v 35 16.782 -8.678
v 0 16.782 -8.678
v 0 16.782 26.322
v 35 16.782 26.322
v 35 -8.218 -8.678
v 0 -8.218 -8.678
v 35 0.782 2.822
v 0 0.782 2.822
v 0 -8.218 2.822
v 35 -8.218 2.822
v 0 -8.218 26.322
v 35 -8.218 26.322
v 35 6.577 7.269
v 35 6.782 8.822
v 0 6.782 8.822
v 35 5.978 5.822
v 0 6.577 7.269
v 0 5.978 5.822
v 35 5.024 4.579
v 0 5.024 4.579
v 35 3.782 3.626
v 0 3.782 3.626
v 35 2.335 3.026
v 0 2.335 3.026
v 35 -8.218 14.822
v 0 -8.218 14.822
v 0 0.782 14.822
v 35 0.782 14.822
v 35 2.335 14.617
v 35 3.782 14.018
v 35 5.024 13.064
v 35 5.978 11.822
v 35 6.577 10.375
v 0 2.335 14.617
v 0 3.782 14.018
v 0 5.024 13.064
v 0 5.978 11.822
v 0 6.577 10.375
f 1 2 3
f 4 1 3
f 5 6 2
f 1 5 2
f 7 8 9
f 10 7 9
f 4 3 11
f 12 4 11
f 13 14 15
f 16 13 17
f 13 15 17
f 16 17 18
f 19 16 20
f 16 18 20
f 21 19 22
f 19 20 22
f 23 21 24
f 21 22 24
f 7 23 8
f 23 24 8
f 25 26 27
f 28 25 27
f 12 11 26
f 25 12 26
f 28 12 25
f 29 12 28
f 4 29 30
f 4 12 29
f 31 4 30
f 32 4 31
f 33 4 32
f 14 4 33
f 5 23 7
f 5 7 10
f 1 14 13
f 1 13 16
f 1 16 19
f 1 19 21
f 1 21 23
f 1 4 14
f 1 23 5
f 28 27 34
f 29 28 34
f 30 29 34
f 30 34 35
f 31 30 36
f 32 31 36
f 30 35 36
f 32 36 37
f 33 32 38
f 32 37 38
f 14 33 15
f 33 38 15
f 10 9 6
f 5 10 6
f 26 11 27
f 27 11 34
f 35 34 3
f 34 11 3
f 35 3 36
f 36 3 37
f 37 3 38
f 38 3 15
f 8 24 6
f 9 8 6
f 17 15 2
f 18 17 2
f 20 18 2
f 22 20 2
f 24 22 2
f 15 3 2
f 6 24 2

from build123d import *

# Parameters (mm, degrees)
BOSS_EXTRUDE1_DEPTH = 35


with BuildPart() as part:
    # Sketch1 → Boss-Extrude1 (new body)
    with BuildSketch(Plane(origin=(0, 0, 0), x_dir=(0, 0, -1), z_dir=(1, 0, 0))):
        with BuildLine():
            Line((-8.82183908, 6.781609195), (-8.82183908, 16.781609195))
            Line((-8.82183908, 16.781609195), (-26.32183908, 16.781609195))
            Line((-26.32183908, 16.781609195), (-26.32183908, -8.218390805))
            Line((-26.32183908, -8.218390805), (-14.82183908, -8.218390805))
            Line((-14.82183908, -8.218390805), (-14.82183908, 0.781609195))
            ThreePointArc((-14.82183908, 0.781609195), (-13.064479768, 5.024249883), (-8.82183908, 6.781609195))
        make_face()
        with BuildLine():
            Line((8.67816092, 16.781609195), (-8.82183908, 16.781609195))
            Line((-8.82183908, 16.781609195), (-8.82183908, 6.781609195))
            ThreePointArc((-8.82183908, 6.781609195), (-4.579198393, 5.024249883), (-2.82183908, 0.781609195))
            Line((-2.82183908, 0.781609195), (-2.82183908, -8.218390805))
            Line((-2.82183908, -8.218390805), (8.67816092, -8.218390805))
            Line((8.67816092, -8.218390805), (8.67816092, 16.781609195))
        make_face()
    extrude(amount=BOSS_EXTRUDE1_DEPTH)


solid = part.part
